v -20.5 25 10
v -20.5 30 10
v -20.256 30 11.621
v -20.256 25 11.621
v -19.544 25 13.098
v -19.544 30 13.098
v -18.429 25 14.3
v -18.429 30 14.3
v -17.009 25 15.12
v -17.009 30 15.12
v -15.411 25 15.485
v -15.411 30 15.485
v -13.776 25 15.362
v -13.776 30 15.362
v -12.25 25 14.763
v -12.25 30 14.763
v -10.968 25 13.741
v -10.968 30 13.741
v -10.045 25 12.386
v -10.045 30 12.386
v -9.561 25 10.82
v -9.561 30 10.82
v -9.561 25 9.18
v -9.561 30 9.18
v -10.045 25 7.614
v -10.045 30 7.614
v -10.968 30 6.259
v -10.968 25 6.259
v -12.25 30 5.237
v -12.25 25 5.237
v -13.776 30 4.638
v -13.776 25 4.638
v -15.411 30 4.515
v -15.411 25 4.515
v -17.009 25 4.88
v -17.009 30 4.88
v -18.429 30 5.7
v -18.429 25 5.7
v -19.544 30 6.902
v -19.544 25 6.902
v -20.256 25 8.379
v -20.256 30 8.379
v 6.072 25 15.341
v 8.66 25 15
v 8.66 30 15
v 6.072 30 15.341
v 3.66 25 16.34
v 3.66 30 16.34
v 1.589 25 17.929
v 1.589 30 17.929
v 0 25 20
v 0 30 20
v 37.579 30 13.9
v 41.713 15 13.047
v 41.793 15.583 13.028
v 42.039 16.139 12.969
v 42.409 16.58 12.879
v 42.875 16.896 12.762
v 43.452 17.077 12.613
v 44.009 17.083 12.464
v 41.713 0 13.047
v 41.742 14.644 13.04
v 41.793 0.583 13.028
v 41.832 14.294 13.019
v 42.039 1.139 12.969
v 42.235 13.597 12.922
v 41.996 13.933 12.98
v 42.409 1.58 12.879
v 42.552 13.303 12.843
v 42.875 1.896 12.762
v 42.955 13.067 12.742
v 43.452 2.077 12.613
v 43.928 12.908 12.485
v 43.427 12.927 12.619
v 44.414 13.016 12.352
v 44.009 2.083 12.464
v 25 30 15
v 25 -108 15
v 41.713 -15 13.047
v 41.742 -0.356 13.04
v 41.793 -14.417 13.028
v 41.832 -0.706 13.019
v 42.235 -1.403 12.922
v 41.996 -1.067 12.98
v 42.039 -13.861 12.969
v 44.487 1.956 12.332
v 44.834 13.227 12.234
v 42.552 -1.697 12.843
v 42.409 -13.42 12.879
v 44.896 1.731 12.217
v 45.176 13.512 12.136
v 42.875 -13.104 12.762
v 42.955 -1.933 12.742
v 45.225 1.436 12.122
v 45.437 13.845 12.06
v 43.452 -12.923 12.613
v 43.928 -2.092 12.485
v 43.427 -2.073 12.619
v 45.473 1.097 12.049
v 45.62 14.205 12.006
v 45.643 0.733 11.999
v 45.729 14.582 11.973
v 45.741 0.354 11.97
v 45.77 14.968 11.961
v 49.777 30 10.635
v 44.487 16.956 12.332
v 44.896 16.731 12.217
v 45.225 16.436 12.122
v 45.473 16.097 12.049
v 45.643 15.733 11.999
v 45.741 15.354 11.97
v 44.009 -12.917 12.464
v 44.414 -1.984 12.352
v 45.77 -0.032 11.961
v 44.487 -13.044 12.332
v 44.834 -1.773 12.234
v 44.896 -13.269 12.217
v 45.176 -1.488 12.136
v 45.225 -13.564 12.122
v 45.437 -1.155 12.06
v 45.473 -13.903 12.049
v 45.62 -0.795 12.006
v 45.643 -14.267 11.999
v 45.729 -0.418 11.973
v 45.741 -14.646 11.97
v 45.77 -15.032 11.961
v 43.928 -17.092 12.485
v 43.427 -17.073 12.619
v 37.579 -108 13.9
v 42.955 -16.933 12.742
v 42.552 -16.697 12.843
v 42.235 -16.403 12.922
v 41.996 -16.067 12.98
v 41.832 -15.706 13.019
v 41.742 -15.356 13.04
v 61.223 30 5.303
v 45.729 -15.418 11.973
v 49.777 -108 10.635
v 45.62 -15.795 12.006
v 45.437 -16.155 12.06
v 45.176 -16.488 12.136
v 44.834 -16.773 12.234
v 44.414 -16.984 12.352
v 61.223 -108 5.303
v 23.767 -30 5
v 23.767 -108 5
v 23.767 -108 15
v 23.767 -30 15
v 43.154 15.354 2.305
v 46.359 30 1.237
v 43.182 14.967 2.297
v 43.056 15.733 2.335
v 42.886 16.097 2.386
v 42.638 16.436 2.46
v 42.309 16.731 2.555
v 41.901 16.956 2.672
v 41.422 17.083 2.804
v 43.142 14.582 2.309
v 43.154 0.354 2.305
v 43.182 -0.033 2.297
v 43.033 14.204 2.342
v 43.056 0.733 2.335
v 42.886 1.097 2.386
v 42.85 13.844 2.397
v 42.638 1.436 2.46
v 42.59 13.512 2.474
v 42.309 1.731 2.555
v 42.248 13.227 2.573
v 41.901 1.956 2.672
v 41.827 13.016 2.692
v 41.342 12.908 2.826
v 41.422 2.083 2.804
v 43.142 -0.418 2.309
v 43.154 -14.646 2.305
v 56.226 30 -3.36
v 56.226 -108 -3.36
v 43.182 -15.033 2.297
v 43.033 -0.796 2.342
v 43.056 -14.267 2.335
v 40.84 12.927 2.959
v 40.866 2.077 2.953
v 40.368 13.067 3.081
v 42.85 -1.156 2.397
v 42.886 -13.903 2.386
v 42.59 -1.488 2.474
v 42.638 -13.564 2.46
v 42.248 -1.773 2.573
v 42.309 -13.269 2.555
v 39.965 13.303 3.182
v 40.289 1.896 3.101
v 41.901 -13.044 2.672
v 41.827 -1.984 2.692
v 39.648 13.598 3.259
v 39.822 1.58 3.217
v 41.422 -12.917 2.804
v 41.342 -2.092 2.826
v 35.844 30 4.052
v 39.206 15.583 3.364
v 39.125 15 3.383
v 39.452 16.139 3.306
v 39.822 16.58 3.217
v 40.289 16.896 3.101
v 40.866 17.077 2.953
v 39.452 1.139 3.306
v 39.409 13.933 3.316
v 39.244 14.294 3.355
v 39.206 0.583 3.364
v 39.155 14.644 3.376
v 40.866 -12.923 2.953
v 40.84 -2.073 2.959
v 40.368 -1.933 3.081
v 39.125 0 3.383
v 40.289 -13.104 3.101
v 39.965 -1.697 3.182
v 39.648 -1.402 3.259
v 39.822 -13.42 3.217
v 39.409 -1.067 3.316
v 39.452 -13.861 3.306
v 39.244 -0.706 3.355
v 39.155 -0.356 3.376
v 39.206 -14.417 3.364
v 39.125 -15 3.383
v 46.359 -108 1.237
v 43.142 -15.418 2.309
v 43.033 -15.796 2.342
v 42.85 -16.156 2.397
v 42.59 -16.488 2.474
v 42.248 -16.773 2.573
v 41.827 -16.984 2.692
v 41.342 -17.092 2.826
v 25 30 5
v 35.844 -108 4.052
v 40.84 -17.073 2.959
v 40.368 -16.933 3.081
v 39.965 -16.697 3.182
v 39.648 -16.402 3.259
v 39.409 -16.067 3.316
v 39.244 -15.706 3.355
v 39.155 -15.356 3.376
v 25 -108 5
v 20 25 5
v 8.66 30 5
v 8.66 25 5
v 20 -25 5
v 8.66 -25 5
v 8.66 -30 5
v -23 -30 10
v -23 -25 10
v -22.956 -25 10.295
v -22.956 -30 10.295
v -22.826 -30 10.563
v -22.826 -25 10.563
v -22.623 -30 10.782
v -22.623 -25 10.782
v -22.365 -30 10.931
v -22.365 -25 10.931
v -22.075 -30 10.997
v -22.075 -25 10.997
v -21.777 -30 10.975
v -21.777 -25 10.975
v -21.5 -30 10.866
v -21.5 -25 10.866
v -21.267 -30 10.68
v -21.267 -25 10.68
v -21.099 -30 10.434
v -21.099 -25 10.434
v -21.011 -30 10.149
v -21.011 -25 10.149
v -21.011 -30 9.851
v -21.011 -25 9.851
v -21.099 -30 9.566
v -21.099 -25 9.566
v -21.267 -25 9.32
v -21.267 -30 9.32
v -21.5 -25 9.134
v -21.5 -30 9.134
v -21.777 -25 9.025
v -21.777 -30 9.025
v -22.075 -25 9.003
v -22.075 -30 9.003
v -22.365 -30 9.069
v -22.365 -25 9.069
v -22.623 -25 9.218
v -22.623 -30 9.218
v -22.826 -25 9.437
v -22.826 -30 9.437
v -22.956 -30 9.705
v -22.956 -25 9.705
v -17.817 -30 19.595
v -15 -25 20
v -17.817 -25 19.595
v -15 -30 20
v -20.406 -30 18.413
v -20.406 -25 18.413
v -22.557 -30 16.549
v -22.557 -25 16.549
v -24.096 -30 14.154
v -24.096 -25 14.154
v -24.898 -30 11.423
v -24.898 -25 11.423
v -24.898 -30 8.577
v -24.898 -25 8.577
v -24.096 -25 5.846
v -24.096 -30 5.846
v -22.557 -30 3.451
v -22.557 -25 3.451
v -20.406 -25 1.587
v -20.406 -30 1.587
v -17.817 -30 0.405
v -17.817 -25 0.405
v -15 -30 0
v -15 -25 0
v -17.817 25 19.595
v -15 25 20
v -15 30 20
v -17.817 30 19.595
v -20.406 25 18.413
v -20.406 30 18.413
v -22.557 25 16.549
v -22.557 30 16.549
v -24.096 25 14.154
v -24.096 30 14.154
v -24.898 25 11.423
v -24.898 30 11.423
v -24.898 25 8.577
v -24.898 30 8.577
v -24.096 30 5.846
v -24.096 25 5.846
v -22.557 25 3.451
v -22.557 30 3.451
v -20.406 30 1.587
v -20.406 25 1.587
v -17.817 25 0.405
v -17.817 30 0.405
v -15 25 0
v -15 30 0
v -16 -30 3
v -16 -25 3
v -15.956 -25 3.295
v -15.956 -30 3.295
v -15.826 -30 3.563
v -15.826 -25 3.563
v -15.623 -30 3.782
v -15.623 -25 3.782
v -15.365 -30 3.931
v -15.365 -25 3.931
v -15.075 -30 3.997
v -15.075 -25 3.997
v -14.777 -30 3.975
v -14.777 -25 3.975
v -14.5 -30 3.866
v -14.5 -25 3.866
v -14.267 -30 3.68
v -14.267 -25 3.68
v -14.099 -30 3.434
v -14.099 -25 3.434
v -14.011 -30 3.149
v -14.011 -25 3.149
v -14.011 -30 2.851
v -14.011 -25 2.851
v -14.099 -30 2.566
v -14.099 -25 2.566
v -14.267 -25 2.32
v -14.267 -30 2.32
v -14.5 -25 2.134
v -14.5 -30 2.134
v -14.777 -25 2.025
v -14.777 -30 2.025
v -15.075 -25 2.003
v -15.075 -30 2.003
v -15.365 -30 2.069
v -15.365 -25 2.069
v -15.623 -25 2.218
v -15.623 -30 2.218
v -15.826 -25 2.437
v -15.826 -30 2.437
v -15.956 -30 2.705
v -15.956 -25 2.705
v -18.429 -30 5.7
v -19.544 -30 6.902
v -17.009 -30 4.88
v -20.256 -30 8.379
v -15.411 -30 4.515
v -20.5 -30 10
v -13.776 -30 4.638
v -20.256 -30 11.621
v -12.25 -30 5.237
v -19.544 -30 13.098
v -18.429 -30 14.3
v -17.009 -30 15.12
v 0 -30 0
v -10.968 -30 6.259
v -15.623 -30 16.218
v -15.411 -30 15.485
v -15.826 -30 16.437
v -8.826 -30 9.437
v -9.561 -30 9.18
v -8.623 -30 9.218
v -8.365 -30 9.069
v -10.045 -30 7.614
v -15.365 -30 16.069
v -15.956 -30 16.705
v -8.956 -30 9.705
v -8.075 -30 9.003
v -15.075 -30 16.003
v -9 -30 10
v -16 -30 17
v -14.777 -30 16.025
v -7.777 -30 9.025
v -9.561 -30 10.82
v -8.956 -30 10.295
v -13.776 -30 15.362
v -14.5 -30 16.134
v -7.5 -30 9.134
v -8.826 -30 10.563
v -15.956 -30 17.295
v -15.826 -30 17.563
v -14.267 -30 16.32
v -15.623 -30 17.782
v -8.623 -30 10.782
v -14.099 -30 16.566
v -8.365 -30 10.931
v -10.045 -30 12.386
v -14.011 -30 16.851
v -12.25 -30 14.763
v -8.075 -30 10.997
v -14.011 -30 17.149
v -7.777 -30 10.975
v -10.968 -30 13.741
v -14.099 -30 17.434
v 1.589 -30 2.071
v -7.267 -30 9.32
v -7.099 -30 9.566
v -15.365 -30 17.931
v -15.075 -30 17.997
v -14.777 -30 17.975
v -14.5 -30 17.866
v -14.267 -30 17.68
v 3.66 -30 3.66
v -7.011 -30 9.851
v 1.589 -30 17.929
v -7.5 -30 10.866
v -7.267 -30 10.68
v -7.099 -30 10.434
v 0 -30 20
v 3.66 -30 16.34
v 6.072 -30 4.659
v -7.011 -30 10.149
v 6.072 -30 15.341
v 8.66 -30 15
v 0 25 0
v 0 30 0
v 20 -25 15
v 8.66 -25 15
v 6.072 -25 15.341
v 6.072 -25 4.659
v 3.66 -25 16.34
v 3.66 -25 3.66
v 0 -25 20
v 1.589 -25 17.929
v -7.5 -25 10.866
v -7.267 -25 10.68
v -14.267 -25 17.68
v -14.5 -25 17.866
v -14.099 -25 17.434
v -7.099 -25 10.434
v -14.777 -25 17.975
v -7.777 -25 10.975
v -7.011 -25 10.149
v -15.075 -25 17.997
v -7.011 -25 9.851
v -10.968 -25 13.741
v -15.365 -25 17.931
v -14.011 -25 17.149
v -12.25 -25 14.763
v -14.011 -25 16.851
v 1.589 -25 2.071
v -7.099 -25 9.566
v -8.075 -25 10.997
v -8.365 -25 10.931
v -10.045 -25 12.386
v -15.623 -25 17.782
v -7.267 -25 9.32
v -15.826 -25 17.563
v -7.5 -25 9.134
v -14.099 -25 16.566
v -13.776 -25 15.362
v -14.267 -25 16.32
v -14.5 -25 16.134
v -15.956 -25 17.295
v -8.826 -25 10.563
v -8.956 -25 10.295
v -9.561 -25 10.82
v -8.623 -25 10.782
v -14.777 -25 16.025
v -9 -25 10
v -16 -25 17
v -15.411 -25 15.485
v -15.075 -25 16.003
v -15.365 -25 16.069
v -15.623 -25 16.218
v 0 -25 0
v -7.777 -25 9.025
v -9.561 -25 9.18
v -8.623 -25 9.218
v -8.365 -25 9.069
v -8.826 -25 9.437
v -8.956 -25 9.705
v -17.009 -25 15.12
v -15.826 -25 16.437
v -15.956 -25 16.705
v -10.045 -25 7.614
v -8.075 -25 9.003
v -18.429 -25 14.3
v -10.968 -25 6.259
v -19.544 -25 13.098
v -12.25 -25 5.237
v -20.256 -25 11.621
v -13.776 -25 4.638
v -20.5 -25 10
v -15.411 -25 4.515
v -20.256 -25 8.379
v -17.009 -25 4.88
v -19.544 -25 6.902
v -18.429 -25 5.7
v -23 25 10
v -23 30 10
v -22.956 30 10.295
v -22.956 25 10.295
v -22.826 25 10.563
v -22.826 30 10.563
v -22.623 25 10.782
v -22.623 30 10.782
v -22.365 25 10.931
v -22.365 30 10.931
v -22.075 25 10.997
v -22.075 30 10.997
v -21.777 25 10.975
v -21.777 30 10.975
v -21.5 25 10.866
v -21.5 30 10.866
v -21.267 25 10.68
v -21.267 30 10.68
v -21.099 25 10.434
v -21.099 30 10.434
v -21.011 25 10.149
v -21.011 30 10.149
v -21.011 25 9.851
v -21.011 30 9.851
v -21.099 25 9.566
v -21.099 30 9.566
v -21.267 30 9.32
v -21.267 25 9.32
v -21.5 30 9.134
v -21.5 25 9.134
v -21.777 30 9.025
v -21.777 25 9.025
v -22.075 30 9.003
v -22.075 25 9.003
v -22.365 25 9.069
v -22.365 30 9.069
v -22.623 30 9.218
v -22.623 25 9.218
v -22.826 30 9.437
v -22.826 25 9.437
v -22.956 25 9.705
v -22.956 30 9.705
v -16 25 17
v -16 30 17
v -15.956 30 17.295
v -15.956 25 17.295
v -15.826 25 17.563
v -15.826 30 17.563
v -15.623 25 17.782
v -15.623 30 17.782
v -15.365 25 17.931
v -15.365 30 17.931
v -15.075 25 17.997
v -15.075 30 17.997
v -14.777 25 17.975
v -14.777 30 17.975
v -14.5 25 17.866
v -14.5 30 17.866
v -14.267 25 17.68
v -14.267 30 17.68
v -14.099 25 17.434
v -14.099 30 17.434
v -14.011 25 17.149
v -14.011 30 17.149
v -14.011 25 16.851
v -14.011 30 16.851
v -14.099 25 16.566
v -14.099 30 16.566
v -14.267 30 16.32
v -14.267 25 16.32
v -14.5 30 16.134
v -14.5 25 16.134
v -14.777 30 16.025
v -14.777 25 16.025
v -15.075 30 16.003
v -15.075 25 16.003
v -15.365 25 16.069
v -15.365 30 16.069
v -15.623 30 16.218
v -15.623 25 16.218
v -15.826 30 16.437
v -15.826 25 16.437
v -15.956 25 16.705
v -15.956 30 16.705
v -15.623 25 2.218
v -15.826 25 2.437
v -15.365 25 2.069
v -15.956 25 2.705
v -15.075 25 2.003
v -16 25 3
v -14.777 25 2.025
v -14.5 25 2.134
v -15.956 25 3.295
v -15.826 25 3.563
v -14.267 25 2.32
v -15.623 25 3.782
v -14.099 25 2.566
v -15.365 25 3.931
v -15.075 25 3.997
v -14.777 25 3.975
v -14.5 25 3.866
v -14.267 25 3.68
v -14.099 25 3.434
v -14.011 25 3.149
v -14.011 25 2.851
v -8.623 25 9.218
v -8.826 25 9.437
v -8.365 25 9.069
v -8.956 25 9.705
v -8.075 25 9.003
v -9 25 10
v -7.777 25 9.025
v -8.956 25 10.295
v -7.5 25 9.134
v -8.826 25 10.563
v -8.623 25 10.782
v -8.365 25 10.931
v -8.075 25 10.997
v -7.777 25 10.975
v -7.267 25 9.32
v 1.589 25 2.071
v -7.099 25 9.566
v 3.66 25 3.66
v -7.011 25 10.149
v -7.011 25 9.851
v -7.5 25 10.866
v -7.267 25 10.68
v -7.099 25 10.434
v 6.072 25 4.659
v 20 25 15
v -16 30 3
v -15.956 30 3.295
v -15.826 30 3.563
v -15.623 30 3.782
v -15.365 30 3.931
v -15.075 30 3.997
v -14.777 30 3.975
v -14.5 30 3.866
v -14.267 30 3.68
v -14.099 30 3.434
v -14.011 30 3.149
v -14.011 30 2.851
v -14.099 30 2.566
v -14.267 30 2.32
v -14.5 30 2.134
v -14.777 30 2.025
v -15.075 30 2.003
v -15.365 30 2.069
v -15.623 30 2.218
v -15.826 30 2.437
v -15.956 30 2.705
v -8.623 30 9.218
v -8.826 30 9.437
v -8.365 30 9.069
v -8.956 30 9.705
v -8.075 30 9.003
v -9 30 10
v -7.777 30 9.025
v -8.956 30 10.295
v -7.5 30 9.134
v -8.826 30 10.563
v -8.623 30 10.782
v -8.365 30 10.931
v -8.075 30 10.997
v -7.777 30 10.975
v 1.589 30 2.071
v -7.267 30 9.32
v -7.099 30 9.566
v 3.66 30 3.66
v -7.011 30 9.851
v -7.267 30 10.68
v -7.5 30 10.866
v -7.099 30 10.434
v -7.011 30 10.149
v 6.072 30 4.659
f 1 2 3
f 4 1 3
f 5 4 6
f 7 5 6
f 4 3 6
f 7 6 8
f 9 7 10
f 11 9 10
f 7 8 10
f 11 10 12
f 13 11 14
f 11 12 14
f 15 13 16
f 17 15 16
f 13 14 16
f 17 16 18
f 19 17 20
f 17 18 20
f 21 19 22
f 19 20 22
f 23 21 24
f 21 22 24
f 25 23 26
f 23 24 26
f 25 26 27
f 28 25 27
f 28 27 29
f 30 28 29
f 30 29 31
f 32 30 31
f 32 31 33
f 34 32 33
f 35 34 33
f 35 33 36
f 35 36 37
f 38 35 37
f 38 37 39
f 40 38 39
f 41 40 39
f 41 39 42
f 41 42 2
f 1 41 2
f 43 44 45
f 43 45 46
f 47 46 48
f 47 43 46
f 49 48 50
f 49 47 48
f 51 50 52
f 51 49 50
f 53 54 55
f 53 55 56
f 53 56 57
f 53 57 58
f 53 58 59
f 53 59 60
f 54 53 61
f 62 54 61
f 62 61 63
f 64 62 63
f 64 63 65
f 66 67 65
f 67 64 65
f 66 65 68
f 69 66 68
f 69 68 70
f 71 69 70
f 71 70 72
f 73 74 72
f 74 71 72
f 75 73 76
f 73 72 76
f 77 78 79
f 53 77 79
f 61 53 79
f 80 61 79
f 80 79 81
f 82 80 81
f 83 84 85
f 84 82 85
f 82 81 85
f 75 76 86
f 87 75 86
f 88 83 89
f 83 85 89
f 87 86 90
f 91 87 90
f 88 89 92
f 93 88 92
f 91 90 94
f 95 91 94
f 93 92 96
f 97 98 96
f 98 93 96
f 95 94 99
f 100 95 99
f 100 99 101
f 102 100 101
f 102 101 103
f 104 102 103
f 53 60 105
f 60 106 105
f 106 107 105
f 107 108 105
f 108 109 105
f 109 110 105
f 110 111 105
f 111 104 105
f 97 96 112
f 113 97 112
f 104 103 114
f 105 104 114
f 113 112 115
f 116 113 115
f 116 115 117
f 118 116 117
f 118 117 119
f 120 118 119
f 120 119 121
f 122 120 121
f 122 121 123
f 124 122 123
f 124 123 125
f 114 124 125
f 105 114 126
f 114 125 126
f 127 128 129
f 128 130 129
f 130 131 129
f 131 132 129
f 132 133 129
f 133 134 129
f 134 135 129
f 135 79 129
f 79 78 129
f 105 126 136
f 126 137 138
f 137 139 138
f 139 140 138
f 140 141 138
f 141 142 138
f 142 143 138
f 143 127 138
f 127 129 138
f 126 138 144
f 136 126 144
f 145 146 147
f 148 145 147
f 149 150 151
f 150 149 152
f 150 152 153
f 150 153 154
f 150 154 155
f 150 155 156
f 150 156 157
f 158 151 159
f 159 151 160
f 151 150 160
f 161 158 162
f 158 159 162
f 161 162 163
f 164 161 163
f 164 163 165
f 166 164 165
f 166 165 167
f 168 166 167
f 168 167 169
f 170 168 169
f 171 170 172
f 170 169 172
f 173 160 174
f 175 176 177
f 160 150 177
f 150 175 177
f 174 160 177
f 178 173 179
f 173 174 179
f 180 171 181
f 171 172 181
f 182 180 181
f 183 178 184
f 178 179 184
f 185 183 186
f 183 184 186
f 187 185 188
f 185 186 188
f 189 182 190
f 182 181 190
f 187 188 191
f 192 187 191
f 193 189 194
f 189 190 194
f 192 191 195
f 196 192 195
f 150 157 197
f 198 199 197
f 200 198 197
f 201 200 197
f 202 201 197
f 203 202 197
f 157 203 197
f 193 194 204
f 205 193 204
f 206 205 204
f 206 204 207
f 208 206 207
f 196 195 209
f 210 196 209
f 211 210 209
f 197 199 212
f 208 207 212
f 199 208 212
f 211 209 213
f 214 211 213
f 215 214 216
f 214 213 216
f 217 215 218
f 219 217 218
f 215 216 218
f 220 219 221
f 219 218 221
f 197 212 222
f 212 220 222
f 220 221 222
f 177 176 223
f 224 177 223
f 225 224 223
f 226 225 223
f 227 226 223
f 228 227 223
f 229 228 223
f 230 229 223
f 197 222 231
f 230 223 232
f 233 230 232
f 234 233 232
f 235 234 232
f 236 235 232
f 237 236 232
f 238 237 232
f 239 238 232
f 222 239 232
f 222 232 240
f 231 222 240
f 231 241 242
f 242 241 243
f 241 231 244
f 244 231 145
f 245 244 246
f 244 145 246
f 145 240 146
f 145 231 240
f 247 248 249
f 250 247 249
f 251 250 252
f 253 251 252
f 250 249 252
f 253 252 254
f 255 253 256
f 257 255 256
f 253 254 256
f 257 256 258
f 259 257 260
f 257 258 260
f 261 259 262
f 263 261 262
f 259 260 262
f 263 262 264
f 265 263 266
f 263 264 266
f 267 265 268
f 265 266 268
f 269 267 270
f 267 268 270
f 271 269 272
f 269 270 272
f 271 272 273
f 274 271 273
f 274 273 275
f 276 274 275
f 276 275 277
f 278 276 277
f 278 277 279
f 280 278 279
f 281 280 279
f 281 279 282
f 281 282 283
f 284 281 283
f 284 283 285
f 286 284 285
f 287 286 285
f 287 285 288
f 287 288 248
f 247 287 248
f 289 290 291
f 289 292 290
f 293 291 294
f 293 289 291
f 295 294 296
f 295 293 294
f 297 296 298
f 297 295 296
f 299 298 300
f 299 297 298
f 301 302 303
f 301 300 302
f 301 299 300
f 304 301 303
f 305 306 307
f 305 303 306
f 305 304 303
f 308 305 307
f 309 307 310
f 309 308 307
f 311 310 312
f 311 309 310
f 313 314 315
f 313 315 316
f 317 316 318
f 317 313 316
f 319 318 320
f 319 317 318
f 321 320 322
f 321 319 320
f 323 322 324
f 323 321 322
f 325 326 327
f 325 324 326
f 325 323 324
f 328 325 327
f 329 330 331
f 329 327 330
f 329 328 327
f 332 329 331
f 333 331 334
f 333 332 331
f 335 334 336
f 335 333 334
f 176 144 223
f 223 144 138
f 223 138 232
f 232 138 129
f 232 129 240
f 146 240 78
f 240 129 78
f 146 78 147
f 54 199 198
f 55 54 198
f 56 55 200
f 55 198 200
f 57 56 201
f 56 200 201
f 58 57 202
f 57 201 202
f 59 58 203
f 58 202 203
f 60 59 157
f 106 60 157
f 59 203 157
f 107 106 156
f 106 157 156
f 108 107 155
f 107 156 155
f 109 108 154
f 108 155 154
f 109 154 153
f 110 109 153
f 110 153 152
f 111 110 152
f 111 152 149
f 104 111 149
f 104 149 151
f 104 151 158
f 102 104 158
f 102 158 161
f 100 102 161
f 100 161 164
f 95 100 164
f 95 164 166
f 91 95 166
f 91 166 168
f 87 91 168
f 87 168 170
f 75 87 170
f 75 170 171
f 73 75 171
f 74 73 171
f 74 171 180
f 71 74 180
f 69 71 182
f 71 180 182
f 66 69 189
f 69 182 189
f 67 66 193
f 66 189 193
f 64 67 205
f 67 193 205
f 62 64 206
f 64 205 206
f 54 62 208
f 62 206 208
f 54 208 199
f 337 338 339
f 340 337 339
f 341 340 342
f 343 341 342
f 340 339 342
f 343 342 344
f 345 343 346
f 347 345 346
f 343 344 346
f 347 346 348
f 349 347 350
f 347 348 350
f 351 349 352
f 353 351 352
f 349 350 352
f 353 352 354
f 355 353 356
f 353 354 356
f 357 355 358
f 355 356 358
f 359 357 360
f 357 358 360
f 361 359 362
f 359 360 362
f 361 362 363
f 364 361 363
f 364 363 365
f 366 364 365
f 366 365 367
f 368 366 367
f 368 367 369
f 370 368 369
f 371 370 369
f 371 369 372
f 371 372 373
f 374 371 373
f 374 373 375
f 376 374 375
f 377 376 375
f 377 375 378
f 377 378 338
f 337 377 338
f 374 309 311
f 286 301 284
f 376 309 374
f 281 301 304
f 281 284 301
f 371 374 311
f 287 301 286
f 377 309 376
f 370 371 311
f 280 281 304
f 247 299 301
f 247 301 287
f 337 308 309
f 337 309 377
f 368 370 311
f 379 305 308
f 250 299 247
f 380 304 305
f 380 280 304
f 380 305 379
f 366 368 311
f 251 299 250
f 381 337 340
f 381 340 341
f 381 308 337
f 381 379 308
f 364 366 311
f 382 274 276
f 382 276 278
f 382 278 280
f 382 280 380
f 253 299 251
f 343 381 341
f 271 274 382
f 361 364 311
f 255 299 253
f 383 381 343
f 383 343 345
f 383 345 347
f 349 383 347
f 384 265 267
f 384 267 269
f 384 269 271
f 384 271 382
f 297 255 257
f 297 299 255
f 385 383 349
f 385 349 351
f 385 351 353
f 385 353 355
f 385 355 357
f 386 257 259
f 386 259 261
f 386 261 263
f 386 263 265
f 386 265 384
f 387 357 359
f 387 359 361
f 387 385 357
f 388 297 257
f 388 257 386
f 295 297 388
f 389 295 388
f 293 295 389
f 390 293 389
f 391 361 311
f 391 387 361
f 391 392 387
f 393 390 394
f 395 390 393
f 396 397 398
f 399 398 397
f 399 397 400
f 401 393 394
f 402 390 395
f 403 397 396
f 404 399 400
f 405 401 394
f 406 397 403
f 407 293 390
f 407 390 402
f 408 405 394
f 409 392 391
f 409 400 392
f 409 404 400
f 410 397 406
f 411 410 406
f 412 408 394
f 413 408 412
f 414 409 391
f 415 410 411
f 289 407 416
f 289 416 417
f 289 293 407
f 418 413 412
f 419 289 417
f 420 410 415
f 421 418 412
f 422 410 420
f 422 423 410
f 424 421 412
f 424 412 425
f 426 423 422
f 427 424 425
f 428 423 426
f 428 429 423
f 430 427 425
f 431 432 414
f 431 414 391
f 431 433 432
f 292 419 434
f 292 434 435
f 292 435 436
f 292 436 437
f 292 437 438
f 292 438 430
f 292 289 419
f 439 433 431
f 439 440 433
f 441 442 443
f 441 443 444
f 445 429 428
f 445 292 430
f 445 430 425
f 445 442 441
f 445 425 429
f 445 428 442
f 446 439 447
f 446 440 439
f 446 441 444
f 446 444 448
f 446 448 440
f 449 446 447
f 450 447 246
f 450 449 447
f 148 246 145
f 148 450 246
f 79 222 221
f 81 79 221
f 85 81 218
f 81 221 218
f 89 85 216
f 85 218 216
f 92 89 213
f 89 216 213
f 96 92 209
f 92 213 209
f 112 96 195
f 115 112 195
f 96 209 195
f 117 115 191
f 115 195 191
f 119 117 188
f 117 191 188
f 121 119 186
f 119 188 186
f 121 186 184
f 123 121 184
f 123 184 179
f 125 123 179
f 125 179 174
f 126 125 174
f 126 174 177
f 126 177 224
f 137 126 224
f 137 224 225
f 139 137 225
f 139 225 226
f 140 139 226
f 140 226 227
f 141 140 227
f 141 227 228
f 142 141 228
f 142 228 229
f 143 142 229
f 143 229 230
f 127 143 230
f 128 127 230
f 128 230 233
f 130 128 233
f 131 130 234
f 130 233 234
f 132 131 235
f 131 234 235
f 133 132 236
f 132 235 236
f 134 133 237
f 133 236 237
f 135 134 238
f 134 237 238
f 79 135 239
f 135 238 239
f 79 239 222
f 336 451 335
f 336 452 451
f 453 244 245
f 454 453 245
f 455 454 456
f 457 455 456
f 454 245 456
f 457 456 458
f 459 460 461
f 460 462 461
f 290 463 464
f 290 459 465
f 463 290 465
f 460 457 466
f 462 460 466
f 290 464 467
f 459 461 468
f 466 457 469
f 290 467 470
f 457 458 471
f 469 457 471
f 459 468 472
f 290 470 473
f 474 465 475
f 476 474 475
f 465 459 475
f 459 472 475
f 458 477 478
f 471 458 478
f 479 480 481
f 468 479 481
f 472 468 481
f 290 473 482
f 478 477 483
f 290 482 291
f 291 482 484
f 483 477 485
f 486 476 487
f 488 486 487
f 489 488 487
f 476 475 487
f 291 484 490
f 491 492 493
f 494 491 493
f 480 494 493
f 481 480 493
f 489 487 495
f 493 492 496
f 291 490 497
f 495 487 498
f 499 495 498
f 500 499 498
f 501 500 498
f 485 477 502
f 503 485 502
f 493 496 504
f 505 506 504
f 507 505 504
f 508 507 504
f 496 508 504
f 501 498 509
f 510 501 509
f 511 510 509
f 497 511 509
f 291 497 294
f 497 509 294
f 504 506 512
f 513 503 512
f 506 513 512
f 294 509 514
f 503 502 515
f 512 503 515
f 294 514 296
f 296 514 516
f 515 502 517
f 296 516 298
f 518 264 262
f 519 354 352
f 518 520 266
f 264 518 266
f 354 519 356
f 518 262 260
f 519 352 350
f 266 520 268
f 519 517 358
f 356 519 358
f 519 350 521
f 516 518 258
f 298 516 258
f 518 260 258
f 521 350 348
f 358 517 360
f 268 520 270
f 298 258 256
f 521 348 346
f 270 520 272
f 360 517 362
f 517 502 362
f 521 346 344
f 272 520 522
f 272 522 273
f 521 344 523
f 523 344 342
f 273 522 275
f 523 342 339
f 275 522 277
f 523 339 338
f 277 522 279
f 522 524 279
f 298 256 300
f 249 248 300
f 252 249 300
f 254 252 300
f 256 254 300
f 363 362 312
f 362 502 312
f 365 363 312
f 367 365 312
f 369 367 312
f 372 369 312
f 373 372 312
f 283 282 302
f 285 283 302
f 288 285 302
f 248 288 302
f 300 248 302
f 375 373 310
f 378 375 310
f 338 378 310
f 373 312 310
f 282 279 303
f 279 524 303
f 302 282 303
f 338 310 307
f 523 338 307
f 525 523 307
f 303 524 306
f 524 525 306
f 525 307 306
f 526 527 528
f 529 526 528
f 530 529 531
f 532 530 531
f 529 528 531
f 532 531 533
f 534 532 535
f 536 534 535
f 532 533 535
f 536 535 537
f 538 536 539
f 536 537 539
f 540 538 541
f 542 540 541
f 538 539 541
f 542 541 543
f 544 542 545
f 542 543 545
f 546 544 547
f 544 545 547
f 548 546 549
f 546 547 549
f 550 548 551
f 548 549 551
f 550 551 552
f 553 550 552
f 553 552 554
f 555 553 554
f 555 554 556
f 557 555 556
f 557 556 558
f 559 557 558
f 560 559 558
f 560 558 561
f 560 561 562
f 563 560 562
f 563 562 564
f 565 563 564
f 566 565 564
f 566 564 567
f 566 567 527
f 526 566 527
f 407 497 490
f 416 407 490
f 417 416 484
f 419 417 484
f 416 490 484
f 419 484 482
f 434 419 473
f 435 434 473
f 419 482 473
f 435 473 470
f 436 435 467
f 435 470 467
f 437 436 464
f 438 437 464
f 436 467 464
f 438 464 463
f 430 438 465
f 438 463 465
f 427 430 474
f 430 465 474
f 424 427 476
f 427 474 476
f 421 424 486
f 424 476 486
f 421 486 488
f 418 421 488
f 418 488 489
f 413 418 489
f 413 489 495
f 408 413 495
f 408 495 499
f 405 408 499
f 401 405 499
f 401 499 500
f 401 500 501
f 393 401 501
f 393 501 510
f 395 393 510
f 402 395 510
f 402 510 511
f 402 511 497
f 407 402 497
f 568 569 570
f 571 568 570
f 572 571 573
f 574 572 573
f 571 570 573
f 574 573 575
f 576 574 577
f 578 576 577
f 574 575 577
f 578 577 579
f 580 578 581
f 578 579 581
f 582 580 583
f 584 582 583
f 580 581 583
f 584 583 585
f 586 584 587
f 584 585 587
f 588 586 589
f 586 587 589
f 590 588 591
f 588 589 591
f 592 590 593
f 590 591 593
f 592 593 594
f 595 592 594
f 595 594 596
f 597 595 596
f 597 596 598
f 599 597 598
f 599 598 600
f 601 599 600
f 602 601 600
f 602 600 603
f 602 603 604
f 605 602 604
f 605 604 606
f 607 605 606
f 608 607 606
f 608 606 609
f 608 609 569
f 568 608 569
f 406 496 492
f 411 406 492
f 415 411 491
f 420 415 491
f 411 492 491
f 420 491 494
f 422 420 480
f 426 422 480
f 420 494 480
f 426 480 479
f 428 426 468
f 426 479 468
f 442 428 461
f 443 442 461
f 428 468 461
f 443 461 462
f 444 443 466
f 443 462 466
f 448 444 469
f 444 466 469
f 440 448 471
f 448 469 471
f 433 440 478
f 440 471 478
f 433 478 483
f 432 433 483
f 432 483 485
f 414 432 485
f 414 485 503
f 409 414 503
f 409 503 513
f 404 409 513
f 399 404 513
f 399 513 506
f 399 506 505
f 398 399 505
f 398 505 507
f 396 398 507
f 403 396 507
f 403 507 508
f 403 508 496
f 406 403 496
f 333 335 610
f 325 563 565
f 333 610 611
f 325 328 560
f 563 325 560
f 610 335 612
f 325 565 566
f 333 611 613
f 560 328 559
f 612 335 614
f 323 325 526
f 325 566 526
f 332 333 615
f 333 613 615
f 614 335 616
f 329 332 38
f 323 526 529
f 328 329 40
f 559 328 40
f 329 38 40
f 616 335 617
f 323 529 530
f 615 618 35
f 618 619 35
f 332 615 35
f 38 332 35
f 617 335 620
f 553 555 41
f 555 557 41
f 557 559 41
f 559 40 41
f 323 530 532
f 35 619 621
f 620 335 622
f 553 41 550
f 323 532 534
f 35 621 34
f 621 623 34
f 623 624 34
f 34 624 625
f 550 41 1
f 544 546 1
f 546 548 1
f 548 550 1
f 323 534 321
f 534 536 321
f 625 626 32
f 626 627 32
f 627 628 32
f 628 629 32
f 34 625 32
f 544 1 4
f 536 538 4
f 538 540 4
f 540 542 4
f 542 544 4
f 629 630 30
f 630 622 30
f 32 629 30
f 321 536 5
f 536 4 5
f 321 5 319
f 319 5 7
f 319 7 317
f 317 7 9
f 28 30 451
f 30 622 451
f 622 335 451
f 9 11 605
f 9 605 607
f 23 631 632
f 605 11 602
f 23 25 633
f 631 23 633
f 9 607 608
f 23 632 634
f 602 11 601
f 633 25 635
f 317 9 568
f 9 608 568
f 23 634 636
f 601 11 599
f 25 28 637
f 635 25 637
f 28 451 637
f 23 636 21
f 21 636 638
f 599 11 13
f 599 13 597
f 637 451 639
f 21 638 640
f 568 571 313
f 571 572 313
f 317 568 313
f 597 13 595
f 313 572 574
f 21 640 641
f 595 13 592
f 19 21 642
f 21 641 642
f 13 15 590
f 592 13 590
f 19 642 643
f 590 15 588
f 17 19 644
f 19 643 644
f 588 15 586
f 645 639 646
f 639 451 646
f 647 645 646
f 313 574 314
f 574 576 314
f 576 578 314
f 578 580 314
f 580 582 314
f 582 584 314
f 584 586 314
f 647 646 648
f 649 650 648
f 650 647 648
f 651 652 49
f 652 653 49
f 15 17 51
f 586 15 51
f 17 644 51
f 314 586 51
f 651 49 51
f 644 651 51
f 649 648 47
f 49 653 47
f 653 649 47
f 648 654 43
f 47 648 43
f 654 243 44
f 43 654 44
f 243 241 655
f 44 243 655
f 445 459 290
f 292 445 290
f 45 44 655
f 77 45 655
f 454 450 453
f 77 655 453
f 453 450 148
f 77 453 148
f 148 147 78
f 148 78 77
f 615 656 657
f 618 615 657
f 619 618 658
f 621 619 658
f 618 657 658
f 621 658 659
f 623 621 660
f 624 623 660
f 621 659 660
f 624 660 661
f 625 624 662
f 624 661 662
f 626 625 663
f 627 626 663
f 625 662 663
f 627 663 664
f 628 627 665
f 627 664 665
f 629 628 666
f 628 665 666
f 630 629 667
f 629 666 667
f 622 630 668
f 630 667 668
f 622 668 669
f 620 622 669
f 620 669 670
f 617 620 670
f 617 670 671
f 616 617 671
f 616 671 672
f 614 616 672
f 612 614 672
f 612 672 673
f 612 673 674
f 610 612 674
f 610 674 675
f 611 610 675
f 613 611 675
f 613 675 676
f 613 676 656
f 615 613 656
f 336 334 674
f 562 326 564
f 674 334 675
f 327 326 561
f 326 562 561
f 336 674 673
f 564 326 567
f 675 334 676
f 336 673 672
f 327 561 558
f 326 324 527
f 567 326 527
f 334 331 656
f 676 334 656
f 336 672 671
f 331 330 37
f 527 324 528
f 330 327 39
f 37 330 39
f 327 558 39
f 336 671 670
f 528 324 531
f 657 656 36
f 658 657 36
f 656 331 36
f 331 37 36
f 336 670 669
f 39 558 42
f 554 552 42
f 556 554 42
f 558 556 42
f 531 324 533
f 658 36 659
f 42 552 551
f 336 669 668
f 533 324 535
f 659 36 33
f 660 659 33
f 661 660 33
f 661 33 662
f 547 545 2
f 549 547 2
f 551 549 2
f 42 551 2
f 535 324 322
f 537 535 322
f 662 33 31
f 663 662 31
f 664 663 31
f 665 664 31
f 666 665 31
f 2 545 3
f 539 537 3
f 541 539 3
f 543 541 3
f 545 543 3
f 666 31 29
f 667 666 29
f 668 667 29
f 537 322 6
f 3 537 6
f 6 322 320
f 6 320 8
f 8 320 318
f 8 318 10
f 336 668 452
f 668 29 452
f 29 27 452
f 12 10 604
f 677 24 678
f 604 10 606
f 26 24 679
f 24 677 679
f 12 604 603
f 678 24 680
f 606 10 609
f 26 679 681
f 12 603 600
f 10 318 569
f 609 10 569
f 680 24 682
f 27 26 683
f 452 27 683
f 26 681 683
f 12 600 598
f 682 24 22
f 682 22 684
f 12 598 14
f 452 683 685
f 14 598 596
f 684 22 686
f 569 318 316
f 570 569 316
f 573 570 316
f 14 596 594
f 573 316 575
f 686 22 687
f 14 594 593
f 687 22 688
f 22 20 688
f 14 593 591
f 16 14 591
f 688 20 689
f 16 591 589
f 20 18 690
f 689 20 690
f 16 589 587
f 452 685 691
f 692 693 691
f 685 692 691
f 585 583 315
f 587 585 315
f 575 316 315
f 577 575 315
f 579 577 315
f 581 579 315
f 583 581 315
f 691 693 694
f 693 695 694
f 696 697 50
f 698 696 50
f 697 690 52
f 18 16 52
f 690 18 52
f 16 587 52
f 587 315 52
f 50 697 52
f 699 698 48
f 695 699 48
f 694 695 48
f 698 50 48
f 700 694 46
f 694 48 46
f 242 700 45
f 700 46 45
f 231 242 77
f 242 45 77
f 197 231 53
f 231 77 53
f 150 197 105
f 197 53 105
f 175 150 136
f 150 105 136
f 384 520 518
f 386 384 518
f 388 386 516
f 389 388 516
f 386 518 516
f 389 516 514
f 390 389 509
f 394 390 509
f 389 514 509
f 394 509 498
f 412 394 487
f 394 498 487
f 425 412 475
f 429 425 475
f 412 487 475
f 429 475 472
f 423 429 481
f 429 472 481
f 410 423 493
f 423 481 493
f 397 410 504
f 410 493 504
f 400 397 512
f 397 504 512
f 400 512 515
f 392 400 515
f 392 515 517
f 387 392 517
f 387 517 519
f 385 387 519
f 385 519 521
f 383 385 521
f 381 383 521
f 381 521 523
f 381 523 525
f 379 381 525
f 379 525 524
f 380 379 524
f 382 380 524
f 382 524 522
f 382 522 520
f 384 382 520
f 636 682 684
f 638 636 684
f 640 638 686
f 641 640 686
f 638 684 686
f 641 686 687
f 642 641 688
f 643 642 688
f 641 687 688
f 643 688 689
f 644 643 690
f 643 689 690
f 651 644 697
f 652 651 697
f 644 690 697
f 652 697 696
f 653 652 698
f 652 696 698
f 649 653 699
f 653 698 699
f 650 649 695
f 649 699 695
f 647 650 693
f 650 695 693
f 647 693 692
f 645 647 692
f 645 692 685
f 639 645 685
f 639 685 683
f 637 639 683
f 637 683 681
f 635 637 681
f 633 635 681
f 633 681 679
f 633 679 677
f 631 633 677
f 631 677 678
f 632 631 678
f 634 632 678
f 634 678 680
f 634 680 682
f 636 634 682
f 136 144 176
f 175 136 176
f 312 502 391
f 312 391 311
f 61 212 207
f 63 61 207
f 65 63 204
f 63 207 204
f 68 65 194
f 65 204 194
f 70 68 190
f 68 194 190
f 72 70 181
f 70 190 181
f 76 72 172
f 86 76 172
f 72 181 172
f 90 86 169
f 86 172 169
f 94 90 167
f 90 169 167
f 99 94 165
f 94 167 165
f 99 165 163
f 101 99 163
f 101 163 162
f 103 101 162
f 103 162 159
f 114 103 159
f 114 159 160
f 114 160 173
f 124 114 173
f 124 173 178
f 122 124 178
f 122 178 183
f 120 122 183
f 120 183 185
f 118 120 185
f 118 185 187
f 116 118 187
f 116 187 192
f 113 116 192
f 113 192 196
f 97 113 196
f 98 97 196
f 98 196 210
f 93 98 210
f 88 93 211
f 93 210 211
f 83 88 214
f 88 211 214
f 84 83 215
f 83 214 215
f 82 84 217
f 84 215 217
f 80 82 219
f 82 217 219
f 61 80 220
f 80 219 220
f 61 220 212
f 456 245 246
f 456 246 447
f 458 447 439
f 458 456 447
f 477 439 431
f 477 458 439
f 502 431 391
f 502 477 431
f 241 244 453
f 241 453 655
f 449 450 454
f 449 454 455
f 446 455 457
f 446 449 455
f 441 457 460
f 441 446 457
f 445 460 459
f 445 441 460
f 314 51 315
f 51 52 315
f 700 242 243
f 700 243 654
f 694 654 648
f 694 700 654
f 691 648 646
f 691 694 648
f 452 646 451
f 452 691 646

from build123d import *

# Parameters (mm, degrees)
BOSS_EXTRUDE2_DEPTH = 20
FILLET1_RADIUS      = 10
FILLET1_LENGTH      = 5
FILLET2_RADIUS      = 10
FILLET2_LENGTH      = 5
SKETCH5_R           = 1
SKETCH5_R_2         = 5.5
CUT_EXTRUDE5_DEPTH  = 69.007352544
CUT_EXTRUDE7_DEPTH  = 25
FILLET5_R           = 10
BOSS_EXTRUDE5_DEPTH = 60
SKETCH13_R          = 2.1
CUT_EXTRUDE8_DEPTH  = 60
BOSS_EXTRUDE6_START = 78
BOSS_EXTRUDE6_DEPTH = 78


with BuildPart() as part:
    # Sketch1 → Boss-Extrude2 (new body)
    with BuildSketch(Plane.XY):
        Polygon((-25, 30), (25, 30), (25, -30), (-25, -30), (-25, -25), (-20, -25), (20, -25), (20, 25), (-20, 25), (-25, 25), align=None)
    extrude(amount=BOSS_EXTRUDE2_DEPTH)

    # Fillet1: full round fillet: the end face becomes a half cylinder, R = half its width
    fillet1_face = Plane((-25, 27.5, 10), x_dir=(0, -1, 0), z_dir=(-1, 0, 0))  # on the end face: x along it, z out of the body
    fillet1_slab = fillet1_face.offset(-FILLET1_RADIUS / 2) * Box(FILLET1_LENGTH, 2 * FILLET1_RADIUS, FILLET1_RADIUS, mode=Mode.PRIVATE)  # the body's end, R deep
    fillet1_round = Plane((-15, 27.5, 10), x_dir=(-1, 0, 0), z_dir=(0, -1, 0)) * Cylinder(FILLET1_RADIUS, FILLET1_LENGTH, mode=Mode.PRIVATE)  # its axis R under the face
    add(fillet1_slab - fillet1_round, mode=Mode.SUBTRACT)

    # Fillet2: full round fillet: the end face becomes a half cylinder, R = half its width
    fillet2_face = Plane((-25, -27.5, 10), x_dir=(0, -1, 0), z_dir=(-1, 0, 0))  # on the end face: x along it, z out of the body
    fillet2_slab = fillet2_face.offset(-FILLET2_RADIUS / 2) * Box(FILLET2_LENGTH, 2 * FILLET2_RADIUS, FILLET2_RADIUS, mode=Mode.PRIVATE)  # the body's end, R deep
    fillet2_round = Plane((-15, -27.5, 10), x_dir=(-1, 0, 0), z_dir=(0, -1, 0)) * Cylinder(FILLET2_RADIUS, FILLET2_LENGTH, mode=Mode.PRIVATE)  # its axis R under the face
    add(fillet2_slab - fillet2_round, mode=Mode.SUBTRACT)

    # Sketch5 → Cut-Extrude5 (cut, through all)
    with BuildSketch(Plane(origin=(0, 30, 0), x_dir=(1, 0, 0), z_dir=(0, 1, 0))):
        with Locations(Location((-15, -3, 0), (0, 0, 180))):
            Circle(SKETCH5_R)
        with Locations(Location((-22, -10, 0), (0, 0, 180))):
            Circle(SKETCH5_R)
        with Locations(Location((-15, -17, 0), (0, 0, 180))):
            Circle(SKETCH5_R)
        with Locations(Location((-8, -10, 0), (0, 0, 180))):
            Circle(SKETCH5_R)
        with Locations(Location((-15, -10, 0), (0, 0, 180))):
            Circle(SKETCH5_R_2)
    extrude(amount=-CUT_EXTRUDE5_DEPTH, mode=Mode.SUBTRACT)

    # Sketch10 → Cut-Extrude7 (cut)
    with BuildSketch(Plane(origin=(25, 0, 0), x_dir=(0, 0, -1), z_dir=(1, 0, 0))):
        Polygon((-15, 28.180148829), (-15, -28.180148829), (-15, -30), (-20, -30), (-20, 30), (-15, 30), align=None)
        Polygon((-5, 28.180148829), (-5, -28.180148829), (-5, -30), (0, -30), (0, 30), (-5, 30), align=None)
    extrude(amount=-CUT_EXTRUDE7_DEPTH, mode=Mode.SUBTRACT)

    # Fillet5
    # the kernel refuses this fillet: 10 mm, written as the material it adds along each edge
    with BuildSketch(Plane(origin=(0, 25, 15), x_dir=(1, 0, 0), z_dir=(0, 1, 0)), Plane(origin=(0, -30, 15), x_dir=(1, 0, 0), z_dir=(0, 1, 0)), Plane(origin=(0, -25, 5), x_dir=(1, 0, 0), z_dir=(0, -1, 0))) as fillet5_piece_1:
        with BuildLine():
            CenterArc((8.660254038, -10), FILLET5_R, 90, 60)
            Line((0, -5), (-0.173205081, -4.9))
            ThreePointArc((-0.173205081, -4.9), (-0.2, -2.5), (-0.2, 0))
            Line((-0.2, 0), (0, 0.2))
            Line((0, 0.2), (8.660254038, 0.2))
            Line((8.660254038, 0.2), (8.660254038, 0))
        make_face()
    extrude(amount=5)
    with BuildSketch(Plane(origin=(0, 30, 5), x_dir=(0, 0, -1), z_dir=(0, -1, 0))) as fillet5_piece_2:
        with BuildLine():
            CenterArc((10, 8.660254038), FILLET5_R, 180, 60)
            Line((0, 8.660254038), (-0.2, 8.660254038))
            Line((-0.2, 8.660254038), (-0.2, 0))
            Line((-0.2, 0), (0, -0.2))
            ThreePointArc((0, -0.2), (2.5, -0.2), (4.9, -0.173205081))
            Line((4.9, -0.173205081), (5, 0))
        make_face()
    extrude(amount=5)

    # Sketch12 → Boss-Extrude5 (add)
    with BuildSketch(Plane.XZ.offset(30)):
        with BuildLine():
            Line((56.226298398, -3.359735054), (61.222506141, 5.302707337))
            ThreePointArc((61.222506141, 5.302707337), (43.74904955, 12.533728595), (25, 15))
            Line((25, 15), (25, 5))
            ThreePointArc((25, 5), (41.16297375, 2.873903962), (56.226298398, -3.359735054))
        make_face()
    extrude(amount=-BOSS_EXTRUDE5_DEPTH)

    # Sketch13 → Cut-Extrude8 (cut)
    with BuildSketch(Plane(origin=(2.920998947, 0, 10.910870277), x_dir=(-0.9659824633840055, 0, 0.2586075800021504), z_dir=(-0.2586075800021504, 0, -0.9659824633840055))):
        with Locations((-39.019497435, 15)):
            Circle(SKETCH13_R)
        with Locations((-39.019497435, 0)):
            Circle(SKETCH13_R)
        with Locations((-39.019497435, -15)):
            Circle(SKETCH13_R)
    extrude(amount=-CUT_EXTRUDE8_DEPTH, mode=Mode.SUBTRACT)

    # Sketch14 → Boss-Extrude6 (add)
    with BuildSketch(Plane.XZ.offset(30).offset(BOSS_EXTRUDE6_START)):
        with BuildLine():
            Line((61.222506141, 5.302707337), (56.226298398, -3.359735054))
            ThreePointArc((56.226298398, -3.359735054), (41.16297375, 2.873903962), (25, 5))
            Line((25, 5), (23.767457853, 5))
            Line((23.767457853, 5), (23.767457853, 15))
            Line((23.767457853, 15), (25, 15))
            ThreePointArc((25, 15), (43.74904955, 12.533728595), (61.222506141, 5.302707337))
        make_face()
    extrude(amount=-BOSS_EXTRUDE6_DEPTH)


solid = part.part
